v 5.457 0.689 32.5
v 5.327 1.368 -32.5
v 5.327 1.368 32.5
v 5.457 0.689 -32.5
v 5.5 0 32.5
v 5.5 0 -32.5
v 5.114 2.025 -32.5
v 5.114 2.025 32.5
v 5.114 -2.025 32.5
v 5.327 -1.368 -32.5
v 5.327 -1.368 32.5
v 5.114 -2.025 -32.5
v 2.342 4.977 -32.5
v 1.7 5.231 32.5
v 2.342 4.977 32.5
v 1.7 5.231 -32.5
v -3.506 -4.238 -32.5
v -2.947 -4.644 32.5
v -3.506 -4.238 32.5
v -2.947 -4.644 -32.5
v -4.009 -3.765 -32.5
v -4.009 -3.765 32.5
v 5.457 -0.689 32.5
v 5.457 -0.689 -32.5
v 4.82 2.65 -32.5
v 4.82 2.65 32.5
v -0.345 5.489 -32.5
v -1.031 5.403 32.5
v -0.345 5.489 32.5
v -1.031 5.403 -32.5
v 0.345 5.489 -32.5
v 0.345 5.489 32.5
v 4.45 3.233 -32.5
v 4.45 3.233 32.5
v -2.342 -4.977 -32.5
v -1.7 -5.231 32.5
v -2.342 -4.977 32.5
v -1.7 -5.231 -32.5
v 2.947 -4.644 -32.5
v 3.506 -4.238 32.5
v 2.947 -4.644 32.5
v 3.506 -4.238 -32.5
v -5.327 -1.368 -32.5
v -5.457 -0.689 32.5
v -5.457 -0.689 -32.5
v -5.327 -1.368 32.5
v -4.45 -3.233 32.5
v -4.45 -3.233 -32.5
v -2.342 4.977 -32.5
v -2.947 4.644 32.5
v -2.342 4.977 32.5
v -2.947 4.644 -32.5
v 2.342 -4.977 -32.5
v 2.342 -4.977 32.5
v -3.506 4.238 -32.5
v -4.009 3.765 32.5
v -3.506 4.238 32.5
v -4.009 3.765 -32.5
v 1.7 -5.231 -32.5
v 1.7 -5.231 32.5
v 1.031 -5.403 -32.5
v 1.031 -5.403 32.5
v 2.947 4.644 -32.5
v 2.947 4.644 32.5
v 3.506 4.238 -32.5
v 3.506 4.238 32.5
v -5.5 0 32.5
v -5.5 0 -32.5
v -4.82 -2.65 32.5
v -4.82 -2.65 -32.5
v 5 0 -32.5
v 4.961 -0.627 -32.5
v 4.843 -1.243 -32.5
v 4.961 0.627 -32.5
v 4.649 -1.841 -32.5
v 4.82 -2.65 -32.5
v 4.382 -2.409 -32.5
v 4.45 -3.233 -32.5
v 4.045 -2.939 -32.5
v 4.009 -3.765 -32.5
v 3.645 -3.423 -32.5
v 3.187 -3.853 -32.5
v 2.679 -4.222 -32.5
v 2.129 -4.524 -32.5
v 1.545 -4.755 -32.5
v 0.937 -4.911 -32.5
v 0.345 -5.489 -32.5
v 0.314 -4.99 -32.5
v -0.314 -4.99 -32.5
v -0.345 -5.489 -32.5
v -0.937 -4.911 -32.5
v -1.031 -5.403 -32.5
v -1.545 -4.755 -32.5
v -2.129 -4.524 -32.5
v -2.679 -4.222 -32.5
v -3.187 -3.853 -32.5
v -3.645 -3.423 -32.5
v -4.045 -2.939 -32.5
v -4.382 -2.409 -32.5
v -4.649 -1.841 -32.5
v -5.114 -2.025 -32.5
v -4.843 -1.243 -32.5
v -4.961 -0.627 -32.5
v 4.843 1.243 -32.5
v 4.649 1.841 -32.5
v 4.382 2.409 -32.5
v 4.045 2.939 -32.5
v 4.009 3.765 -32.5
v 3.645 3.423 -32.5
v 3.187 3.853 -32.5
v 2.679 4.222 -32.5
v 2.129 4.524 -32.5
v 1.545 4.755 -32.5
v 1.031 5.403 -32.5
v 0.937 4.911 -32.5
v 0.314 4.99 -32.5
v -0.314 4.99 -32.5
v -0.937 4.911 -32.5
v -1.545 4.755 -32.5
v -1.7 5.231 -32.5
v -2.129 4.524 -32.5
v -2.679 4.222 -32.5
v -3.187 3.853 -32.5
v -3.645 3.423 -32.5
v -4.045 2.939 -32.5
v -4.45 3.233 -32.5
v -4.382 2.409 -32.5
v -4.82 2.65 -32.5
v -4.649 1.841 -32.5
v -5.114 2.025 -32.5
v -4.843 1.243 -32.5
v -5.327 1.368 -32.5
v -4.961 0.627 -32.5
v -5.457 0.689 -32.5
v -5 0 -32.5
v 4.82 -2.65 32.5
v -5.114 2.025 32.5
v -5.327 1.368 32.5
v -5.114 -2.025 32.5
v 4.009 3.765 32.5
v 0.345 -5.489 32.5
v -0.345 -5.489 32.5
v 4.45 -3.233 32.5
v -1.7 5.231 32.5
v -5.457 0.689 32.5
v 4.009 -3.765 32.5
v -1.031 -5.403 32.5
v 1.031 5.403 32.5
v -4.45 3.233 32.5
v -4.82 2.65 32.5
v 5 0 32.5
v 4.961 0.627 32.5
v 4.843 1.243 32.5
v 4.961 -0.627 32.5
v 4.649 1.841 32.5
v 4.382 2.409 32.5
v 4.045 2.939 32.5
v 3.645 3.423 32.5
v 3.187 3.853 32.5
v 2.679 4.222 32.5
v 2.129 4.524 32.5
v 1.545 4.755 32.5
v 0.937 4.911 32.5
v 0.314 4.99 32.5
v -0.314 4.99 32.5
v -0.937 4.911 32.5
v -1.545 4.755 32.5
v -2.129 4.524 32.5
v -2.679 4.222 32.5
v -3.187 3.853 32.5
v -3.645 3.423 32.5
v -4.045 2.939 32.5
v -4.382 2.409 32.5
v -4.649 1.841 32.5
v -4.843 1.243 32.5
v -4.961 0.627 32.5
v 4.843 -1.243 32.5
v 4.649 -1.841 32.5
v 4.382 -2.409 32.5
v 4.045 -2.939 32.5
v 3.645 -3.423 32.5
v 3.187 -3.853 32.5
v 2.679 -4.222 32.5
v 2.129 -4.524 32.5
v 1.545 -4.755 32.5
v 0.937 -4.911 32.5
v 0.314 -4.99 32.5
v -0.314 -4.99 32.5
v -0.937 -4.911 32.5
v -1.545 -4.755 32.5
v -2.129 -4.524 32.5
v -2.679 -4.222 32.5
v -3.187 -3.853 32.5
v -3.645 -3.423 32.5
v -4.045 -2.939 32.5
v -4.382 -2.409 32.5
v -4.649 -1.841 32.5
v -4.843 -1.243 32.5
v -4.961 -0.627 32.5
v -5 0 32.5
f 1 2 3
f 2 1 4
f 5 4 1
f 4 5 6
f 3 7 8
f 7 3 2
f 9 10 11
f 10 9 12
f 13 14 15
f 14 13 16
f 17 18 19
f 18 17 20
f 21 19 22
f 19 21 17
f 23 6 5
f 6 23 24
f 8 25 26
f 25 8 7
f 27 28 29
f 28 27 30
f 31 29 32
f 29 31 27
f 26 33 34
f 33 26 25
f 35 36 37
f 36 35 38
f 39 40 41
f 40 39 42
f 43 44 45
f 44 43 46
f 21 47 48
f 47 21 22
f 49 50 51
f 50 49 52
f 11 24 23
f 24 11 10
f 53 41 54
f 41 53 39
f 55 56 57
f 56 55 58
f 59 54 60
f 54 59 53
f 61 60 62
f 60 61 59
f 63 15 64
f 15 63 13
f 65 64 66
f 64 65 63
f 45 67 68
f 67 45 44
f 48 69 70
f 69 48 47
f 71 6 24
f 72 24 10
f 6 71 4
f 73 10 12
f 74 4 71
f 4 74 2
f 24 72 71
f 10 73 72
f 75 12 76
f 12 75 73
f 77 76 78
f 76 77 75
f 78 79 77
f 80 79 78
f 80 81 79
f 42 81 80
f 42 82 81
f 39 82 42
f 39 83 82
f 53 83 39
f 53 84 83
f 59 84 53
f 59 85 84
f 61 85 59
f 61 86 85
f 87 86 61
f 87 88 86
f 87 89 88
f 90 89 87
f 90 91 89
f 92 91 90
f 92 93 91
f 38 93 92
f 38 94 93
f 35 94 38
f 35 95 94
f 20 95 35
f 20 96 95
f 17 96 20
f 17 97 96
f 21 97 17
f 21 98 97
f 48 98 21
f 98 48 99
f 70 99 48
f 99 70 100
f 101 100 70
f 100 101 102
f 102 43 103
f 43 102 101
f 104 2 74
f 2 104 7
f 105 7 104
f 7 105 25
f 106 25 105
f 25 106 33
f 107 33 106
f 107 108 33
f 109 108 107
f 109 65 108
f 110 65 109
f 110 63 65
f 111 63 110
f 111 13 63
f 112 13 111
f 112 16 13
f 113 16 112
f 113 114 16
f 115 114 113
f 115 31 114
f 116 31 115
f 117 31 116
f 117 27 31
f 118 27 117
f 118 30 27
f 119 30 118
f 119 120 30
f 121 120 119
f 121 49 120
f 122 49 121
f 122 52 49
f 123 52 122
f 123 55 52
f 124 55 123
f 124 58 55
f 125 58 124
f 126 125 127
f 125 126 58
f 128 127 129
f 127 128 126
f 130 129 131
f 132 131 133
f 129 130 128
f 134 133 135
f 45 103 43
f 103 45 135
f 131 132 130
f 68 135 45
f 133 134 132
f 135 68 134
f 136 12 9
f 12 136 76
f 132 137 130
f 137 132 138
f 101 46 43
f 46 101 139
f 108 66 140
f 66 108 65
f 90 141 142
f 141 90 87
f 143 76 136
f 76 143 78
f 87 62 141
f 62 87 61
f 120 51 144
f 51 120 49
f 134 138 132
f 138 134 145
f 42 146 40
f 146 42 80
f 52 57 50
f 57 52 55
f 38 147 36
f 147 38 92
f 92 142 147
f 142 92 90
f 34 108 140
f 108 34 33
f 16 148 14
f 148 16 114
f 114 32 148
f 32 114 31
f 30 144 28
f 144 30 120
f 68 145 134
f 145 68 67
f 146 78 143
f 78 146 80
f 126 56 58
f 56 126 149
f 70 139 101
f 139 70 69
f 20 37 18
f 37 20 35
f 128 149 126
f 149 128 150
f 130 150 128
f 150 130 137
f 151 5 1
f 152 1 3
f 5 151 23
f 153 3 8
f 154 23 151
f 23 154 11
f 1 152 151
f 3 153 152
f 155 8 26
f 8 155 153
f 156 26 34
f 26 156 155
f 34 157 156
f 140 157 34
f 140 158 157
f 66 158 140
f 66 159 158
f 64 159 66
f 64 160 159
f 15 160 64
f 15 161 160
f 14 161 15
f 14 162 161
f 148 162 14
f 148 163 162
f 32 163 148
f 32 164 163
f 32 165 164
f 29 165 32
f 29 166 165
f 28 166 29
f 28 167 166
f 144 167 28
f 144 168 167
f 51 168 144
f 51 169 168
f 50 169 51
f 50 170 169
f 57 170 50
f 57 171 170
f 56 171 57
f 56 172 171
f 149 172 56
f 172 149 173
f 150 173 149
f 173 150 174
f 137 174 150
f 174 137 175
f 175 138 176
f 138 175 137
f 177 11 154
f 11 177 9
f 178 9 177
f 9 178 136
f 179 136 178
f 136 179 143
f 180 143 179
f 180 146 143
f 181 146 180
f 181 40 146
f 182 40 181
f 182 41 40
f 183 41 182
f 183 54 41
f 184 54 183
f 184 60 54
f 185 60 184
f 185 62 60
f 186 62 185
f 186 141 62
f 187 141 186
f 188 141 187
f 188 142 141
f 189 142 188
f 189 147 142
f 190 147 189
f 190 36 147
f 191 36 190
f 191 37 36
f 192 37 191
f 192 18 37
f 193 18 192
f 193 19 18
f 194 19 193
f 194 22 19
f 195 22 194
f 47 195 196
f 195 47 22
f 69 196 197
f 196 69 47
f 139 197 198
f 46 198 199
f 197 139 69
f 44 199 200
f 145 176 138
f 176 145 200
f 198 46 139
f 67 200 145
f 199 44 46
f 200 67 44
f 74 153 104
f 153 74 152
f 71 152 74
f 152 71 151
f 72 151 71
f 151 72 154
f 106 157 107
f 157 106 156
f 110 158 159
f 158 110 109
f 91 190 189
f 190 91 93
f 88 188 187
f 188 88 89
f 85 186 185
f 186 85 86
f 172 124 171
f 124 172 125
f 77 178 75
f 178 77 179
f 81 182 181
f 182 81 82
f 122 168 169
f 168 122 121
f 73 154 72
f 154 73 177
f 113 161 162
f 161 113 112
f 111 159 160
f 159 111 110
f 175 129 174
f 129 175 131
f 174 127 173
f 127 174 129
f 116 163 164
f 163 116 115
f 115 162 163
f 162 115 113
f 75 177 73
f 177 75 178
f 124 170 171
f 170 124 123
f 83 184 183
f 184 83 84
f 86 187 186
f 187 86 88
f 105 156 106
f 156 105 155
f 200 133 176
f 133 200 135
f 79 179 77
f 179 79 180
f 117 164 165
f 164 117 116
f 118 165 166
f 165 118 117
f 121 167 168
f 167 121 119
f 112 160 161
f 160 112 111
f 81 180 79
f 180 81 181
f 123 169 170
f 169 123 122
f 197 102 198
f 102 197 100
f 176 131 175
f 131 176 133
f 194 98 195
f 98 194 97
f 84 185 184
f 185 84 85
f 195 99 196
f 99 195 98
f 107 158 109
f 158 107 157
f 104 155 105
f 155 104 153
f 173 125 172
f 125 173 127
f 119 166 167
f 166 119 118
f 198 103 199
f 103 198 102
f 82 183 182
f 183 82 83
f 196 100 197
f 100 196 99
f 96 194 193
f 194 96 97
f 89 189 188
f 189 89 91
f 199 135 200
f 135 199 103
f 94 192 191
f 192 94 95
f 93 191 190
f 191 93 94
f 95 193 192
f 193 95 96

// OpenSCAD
$fn = 50;


difference() {
	union() {
		translate(v = [0, 0, -32.5000000000]) {
			cylinder(h = 65, r = 5.5000000000);
		}
	}
	union() {
		translate(v = [0, 0, -100.0000000000]) {
			cylinder(h = 200, r = 5.0000000000);
		}
	}
}
